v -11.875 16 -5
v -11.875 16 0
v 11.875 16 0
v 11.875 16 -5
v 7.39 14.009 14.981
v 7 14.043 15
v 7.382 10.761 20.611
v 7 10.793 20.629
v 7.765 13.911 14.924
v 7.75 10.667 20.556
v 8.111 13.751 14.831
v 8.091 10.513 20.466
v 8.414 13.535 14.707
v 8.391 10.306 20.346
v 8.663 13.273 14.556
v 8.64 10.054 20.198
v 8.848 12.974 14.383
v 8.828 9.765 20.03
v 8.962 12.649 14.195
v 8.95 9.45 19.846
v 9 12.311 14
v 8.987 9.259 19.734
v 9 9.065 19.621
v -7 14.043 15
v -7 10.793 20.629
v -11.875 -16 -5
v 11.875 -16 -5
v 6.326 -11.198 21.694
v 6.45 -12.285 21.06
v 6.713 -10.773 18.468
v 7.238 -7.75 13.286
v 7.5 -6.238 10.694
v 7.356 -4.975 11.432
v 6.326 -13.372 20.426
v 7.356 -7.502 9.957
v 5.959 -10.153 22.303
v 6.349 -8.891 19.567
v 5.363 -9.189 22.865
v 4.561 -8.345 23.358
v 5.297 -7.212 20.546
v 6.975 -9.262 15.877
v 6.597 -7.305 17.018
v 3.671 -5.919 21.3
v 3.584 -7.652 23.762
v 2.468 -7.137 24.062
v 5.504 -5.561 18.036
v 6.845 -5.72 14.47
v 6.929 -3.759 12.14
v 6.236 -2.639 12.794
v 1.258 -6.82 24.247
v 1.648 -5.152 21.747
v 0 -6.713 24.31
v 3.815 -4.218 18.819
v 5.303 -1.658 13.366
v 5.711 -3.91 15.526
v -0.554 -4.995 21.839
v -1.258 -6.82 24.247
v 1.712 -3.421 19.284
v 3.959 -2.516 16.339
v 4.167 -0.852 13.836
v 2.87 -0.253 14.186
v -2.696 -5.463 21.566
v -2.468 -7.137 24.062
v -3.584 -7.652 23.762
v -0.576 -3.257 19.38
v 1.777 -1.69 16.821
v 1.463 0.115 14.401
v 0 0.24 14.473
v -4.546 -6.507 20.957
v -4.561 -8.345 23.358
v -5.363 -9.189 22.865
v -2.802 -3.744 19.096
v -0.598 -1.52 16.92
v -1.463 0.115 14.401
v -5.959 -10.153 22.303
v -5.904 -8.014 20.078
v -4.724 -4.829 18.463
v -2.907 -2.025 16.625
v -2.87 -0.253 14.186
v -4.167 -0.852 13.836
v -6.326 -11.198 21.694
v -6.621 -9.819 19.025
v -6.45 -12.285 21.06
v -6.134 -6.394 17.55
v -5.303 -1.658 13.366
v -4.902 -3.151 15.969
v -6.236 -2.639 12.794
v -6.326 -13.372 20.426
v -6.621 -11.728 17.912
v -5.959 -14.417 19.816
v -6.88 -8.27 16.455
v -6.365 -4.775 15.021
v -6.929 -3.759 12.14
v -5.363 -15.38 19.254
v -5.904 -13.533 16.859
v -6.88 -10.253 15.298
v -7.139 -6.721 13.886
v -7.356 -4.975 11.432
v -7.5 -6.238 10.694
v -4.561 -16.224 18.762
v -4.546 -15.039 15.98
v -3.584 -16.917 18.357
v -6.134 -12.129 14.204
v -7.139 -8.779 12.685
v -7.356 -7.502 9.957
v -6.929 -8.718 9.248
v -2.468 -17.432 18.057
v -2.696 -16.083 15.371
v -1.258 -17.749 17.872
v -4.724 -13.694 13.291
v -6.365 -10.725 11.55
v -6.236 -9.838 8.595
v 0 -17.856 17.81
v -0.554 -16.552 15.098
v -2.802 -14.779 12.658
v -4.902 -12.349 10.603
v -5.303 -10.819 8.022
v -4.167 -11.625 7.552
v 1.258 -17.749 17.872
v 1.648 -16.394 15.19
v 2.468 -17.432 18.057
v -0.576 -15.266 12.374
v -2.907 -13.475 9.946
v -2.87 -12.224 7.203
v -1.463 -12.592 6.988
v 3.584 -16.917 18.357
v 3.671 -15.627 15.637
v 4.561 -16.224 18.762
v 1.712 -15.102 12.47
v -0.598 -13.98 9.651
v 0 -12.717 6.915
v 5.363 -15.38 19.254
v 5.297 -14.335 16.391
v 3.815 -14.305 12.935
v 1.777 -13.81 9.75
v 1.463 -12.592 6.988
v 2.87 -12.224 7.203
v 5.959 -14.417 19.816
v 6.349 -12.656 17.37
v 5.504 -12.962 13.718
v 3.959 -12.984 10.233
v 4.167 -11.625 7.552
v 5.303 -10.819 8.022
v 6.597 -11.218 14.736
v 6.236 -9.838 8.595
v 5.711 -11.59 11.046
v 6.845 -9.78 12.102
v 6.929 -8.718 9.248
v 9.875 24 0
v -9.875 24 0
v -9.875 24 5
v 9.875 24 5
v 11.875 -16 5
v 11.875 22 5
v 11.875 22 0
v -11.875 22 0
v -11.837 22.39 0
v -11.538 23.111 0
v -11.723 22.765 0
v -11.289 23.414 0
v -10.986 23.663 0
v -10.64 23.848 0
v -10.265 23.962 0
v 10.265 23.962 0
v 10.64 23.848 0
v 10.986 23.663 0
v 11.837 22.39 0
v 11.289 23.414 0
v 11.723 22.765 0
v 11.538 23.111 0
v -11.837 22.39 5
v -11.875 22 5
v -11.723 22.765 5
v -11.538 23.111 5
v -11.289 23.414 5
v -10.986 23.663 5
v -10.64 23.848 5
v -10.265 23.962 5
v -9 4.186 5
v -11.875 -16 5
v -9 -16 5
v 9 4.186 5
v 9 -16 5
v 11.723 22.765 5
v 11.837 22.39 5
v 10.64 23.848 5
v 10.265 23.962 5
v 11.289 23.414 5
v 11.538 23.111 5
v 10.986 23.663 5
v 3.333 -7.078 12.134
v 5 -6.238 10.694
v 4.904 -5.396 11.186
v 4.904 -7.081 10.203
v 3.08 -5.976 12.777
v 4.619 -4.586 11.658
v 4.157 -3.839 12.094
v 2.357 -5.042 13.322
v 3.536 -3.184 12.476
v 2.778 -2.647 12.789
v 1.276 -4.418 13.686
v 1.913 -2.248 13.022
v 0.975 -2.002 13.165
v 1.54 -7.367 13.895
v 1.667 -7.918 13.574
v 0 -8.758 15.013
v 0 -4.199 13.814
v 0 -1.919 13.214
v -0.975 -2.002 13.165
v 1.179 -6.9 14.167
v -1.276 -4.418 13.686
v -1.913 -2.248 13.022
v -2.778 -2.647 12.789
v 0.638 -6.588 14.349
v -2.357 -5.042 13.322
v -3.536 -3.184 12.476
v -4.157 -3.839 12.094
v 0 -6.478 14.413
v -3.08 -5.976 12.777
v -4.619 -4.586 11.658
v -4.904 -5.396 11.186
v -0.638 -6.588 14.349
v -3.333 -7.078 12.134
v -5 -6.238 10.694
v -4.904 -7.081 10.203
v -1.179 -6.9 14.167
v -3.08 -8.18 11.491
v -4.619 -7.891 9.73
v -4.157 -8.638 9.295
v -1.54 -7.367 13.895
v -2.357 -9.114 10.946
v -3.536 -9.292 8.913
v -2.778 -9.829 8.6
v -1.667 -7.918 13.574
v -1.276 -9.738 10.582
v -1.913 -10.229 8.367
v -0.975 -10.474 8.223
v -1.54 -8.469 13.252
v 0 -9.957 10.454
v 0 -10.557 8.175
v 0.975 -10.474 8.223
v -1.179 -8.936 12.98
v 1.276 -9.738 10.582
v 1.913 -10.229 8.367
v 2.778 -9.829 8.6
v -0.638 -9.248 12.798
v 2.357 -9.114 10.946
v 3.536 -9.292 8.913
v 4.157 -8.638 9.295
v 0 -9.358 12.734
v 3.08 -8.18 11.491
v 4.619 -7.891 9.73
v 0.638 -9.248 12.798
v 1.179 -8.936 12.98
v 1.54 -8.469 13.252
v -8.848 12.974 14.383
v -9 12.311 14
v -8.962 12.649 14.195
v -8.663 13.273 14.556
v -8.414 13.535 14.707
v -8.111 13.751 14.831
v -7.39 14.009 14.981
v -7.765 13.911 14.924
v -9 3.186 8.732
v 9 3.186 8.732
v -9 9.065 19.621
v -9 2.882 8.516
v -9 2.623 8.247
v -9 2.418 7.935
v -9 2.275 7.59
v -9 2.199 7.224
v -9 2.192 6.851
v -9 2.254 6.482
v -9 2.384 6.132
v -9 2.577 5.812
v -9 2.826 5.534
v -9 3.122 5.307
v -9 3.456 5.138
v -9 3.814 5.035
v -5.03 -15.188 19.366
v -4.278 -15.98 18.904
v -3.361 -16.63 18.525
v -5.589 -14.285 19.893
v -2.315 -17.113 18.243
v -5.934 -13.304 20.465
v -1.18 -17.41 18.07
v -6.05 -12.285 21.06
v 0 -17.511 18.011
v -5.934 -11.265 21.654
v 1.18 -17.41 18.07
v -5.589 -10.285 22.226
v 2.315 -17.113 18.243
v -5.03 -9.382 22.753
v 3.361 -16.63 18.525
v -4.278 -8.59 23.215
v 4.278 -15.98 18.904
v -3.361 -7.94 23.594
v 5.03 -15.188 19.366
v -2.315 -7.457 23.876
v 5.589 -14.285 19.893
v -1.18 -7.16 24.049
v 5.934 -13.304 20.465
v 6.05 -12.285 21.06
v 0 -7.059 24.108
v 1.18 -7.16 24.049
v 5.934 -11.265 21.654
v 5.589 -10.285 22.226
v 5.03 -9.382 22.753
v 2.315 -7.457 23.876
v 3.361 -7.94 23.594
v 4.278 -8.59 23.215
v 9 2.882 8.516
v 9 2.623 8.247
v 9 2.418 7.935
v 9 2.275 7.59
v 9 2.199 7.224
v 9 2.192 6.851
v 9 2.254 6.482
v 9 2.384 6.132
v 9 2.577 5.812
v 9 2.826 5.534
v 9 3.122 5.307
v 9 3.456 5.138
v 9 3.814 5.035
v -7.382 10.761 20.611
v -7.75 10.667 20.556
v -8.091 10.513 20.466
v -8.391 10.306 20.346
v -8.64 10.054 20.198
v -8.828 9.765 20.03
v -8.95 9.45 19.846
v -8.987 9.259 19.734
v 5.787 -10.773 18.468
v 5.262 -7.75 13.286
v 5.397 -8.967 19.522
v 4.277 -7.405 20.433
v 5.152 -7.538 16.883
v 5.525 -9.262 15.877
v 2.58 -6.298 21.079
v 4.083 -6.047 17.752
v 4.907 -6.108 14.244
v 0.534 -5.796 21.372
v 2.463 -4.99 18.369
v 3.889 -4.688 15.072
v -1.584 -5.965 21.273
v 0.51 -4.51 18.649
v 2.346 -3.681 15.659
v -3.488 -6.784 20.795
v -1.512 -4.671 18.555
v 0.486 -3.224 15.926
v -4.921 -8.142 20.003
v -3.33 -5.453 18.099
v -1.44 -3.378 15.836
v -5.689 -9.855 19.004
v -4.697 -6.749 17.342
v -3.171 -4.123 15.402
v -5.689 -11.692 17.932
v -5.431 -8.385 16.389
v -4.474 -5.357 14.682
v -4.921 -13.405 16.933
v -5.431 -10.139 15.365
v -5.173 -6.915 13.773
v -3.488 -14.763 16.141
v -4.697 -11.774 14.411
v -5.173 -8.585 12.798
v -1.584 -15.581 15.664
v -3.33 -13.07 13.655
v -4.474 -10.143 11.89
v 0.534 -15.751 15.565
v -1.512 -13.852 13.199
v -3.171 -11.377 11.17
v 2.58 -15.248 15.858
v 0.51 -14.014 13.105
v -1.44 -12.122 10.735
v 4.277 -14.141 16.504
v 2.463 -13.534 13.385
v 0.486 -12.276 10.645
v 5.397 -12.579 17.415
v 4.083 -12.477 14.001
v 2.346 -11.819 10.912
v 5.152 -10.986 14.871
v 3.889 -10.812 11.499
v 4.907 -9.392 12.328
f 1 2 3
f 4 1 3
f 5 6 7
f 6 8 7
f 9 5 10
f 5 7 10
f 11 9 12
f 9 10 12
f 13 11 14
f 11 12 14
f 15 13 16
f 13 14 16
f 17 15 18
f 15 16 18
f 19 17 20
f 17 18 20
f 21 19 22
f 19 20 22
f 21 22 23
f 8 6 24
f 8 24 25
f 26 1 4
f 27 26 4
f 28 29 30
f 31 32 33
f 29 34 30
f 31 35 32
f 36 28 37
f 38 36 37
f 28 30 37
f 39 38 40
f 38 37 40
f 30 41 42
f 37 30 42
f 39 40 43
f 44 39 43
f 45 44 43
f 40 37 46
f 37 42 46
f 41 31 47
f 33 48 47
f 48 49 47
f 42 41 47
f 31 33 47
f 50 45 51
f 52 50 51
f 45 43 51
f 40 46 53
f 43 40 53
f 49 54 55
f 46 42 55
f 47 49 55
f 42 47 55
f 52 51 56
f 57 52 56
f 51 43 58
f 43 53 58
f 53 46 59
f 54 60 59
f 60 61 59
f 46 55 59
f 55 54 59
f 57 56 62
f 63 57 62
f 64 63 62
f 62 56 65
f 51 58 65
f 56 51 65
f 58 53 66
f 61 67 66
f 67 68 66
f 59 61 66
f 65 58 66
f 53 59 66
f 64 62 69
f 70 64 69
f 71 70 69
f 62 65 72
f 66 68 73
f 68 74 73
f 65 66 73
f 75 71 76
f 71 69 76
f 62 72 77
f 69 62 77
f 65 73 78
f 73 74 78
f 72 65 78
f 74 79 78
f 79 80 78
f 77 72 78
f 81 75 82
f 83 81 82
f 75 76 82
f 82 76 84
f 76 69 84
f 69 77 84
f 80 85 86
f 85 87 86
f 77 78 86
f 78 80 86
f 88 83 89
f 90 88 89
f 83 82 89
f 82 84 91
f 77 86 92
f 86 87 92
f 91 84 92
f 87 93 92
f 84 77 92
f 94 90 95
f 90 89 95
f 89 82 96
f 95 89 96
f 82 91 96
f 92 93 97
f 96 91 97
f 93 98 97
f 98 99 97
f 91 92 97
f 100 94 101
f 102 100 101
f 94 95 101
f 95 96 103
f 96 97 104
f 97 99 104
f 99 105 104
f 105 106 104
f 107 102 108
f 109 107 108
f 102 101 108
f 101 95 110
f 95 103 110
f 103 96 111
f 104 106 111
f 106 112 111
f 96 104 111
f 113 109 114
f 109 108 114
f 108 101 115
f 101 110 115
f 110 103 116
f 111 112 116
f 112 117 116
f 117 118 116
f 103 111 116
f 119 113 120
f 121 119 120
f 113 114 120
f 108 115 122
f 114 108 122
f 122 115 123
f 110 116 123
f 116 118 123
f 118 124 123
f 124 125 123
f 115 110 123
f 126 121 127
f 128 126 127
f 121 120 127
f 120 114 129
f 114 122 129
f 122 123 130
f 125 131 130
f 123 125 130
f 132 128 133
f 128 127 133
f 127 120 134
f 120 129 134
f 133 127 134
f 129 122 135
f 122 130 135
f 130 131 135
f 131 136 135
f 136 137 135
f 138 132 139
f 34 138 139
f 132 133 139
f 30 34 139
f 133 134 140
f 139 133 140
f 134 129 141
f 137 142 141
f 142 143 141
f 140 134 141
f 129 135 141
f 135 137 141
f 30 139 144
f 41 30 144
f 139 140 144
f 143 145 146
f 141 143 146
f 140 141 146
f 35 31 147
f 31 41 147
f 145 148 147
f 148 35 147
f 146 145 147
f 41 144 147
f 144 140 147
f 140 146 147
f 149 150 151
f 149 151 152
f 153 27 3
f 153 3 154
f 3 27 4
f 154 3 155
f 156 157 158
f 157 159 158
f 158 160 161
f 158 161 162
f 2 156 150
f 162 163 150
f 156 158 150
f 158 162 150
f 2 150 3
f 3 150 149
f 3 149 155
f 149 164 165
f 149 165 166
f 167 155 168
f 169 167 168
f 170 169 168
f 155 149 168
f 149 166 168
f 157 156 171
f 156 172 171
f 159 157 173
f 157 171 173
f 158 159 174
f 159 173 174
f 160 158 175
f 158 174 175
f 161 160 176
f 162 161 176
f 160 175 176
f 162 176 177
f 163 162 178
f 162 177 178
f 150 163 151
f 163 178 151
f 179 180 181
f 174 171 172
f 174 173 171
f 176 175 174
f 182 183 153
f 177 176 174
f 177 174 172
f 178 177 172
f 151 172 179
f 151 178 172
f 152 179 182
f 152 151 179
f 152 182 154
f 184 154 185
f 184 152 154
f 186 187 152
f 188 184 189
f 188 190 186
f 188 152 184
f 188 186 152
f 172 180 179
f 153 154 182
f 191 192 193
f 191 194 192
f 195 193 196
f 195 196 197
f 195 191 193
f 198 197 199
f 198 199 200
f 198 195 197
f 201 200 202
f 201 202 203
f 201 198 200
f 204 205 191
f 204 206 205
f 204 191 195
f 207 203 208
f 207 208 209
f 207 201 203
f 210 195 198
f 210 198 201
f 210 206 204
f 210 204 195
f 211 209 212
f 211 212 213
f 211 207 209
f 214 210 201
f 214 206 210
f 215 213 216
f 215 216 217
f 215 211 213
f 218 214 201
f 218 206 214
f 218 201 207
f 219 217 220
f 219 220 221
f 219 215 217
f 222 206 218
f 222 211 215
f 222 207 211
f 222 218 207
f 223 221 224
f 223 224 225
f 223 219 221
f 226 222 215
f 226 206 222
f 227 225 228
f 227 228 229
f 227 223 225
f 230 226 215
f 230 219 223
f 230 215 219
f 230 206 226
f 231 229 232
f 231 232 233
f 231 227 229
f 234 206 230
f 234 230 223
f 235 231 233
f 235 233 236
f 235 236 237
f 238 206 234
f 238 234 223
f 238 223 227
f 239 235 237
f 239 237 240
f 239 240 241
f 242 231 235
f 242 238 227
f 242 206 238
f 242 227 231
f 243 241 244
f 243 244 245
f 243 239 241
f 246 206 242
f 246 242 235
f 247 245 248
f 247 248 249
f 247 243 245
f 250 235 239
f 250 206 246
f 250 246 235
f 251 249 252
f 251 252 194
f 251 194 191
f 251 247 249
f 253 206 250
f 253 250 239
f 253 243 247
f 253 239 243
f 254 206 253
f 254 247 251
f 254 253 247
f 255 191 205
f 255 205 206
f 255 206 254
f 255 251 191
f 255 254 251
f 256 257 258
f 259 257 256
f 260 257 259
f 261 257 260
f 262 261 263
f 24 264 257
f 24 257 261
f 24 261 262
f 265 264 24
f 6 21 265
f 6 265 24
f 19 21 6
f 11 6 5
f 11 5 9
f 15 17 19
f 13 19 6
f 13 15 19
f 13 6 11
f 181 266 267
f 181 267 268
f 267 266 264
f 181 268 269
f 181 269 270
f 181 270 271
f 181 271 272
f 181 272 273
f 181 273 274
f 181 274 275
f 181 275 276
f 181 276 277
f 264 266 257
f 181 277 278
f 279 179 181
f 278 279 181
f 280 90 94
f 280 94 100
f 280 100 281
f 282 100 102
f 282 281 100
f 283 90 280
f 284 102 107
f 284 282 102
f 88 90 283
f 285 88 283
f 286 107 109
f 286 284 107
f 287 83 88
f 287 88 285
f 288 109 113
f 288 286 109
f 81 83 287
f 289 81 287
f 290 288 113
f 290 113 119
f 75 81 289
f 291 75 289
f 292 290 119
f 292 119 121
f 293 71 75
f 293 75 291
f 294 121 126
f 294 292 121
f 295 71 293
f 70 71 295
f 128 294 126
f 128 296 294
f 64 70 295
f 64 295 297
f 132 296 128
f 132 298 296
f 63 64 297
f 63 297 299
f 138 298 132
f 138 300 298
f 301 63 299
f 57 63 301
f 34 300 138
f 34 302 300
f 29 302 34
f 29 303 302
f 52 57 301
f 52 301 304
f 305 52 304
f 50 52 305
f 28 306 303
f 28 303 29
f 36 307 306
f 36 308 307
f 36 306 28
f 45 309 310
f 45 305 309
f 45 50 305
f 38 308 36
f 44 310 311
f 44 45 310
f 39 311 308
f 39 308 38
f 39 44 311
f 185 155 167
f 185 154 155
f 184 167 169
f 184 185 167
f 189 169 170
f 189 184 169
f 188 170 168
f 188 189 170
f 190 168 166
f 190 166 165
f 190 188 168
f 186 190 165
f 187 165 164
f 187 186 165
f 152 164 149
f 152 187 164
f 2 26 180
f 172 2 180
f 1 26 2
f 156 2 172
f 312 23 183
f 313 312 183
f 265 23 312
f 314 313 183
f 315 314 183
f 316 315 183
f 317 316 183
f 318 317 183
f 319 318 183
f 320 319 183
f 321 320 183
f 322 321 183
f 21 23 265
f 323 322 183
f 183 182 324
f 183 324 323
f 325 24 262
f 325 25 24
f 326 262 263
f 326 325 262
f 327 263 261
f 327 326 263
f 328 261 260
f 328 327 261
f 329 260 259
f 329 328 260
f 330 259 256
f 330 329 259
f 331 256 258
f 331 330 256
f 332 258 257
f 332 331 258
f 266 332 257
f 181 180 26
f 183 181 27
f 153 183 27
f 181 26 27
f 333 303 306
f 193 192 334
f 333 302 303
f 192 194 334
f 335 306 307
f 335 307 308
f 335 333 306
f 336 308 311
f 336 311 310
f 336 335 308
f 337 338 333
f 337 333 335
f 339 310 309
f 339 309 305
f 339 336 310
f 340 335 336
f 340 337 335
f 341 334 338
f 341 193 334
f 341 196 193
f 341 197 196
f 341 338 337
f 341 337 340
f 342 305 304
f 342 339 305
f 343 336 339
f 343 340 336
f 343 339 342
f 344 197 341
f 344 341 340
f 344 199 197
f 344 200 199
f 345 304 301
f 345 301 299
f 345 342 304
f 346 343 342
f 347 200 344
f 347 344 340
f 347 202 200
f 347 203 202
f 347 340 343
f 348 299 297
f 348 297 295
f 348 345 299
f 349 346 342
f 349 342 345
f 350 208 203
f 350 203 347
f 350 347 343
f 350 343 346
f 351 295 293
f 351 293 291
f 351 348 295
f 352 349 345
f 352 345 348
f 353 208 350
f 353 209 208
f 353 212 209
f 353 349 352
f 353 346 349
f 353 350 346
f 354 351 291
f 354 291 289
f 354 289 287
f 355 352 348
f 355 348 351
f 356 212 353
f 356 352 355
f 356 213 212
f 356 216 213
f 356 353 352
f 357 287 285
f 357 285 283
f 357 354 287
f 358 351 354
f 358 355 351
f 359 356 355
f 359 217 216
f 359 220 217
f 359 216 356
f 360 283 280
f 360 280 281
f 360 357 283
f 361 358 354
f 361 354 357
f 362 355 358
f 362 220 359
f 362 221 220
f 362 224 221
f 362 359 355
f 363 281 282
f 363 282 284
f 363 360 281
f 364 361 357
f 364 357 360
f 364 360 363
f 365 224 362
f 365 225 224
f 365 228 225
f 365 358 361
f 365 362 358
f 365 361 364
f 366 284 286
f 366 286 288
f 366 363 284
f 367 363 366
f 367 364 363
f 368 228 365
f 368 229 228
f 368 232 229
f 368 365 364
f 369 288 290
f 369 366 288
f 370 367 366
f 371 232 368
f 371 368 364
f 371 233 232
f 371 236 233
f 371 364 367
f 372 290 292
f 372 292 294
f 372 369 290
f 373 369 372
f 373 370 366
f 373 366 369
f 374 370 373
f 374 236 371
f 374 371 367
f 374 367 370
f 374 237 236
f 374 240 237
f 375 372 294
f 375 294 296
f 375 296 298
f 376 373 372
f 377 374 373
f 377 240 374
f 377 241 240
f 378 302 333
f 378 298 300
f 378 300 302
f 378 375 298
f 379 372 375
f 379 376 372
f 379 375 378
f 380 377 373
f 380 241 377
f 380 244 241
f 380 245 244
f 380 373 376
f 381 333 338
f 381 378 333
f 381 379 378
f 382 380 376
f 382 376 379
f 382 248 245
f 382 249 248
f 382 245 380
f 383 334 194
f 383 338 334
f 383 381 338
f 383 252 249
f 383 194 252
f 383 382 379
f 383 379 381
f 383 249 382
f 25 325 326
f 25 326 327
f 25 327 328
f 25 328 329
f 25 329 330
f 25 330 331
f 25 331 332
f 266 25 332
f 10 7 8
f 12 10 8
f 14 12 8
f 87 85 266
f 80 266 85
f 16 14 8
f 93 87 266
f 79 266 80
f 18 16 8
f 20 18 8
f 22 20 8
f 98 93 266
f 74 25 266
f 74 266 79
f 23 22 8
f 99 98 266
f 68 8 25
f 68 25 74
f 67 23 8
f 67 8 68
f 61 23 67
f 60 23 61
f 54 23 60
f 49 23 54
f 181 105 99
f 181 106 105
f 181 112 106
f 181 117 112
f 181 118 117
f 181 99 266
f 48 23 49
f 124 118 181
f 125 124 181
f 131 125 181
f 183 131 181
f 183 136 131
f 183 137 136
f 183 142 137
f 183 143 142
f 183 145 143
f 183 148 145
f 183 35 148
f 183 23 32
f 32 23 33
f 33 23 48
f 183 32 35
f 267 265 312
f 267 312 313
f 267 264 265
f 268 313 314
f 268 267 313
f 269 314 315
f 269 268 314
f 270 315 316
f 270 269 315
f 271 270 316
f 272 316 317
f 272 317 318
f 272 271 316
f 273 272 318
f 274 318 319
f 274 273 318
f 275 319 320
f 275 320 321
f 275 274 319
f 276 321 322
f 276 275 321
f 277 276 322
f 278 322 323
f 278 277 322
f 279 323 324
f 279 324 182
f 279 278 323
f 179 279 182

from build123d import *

# Parameters (mm, degrees)
SKETCH2_W           = 23.75
SKETCH2_H           = 32
BOSS_EXTRUDE1_DEPTH = 5
SKETCH3_W           = 23.75
SKETCH3_H           = 40
BOSS_EXTRUDE2_DEPTH = 5
BOSS_EXTRUDE3_START = -11.875
BOSS_EXTRUDE3_DEPTH = 9
SKETCH5_R           = 7.5
SKETCH5_R_2         = 5
BOSS_EXTRUDE4_DEPTH = 12
BOSS_EXTRUDE4_DRAFT = 5
SKETCH6_R           = 5
BOSS_EXTRUDE5_DEPTH = 5
BOSS_EXTRUDE5_TAPER = 45
FILLET1_R           = 2


with BuildPart() as part:
    # Sketch2 → Boss-Extrude1 (new body)
    with BuildSketch(Plane.XY):
        Rectangle(SKETCH2_W, SKETCH2_H)
    extrude(amount=-BOSS_EXTRUDE1_DEPTH)

    # Sketch3 → Boss-Extrude2 (add)
    with BuildSketch(Plane.XY):
        with Locations((0, 4)):
            Rectangle(SKETCH3_W, SKETCH3_H)
    extrude(amount=BOSS_EXTRUDE2_DEPTH)

    # Sketch4 → Boss-Extrude3 (add, symmetric)
    with BuildSketch(Plane(origin=(11.875, 0, 0), x_dir=(0, 0, -1), z_dir=(1, 0, 0)).offset(BOSS_EXTRUDE3_START)):
        Polygon((-5, -3.277778494), (-15, 14.042729581), (-20.629165125, 10.792729581), (-5, -16), align=None)
    extrude(amount=BOSS_EXTRUDE3_DEPTH, both=True)


with BuildPart() as boss_extrude4_tool:
    # Sketch5 → Boss-Extrude4 (with draft: the straight prism first)
    with BuildSketch(Plane(origin=(0, -6.238375225, 10.694307668), x_dir=(1, 0, 0), z_dir=(0, -0.50387277832175, 0.863777878430746))):
        Circle(SKETCH5_R)
        Circle(SKETCH5_R_2, mode=Mode.SUBTRACT)
    extrude(amount=BOSS_EXTRUDE4_DEPTH)
    # Boss-Extrude4: the draft: its side faces are tilted about the plane it starts from
    boss_extrude4_sides = [boss_extrude4_tool.faces().sort_by_distance(p)[0] for p in [
        (-7.5, -9.261611895, 15.876974938),
        (-5, -9.261611895, 15.876974938),
    ]]
    draft(boss_extrude4_sides, Plane(origin=(0, -6.238375225, 10.694307668), x_dir=(1, 0, 0), z_dir=(0, -0.50387277832175, 0.863777878430746)), BOSS_EXTRUDE4_DRAFT)


with BuildPart() as part_1:
    add(part.part)

    # Boss-Extrude4: add boss_extrude4_tool
    add(boss_extrude4_tool.part)

    # Sketch6 → Boss-Extrude5 (add)
    with BuildSketch(Plane(origin=(0, -6.238375225, 10.694307668), x_dir=(1, 0, 0), z_dir=(0, -0.50387277832175, 0.863777878430746))):
        Circle(SKETCH6_R)
    extrude(amount=BOSS_EXTRUDE5_DEPTH, taper=BOSS_EXTRUDE5_TAPER)

    # Fillet1
    fillet1_edges = [part_1.edges().sort_by_distance(p)[0] for p in [
        (-11.875, 24, 2.5),
        (11.875, 24, 2.5),
        (0, -3.277778494, 5),
        (-9, 12.417729581, 17.814582562),
        (9, 12.417729581, 17.814582562),
    ]]
    fillet(fillet1_edges, radius=FILLET1_R)


solid = part_1.part
